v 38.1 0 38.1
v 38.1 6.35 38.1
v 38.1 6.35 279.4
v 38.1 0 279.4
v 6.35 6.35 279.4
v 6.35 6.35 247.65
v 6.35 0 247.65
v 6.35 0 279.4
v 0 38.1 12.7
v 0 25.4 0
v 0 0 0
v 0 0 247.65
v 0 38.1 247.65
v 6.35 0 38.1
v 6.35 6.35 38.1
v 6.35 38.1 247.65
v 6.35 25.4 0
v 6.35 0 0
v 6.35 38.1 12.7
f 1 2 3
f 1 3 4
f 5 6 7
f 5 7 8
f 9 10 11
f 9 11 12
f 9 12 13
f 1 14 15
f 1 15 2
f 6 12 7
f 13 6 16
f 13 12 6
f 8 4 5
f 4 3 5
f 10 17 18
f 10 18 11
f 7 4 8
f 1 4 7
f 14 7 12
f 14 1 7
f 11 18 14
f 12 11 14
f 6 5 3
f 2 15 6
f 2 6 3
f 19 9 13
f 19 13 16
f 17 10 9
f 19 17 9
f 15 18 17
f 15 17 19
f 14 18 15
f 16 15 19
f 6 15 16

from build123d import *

# Parameters (mm, degrees)
BOSS_EXTRUDE1_DEPTH = 279.4
SKETCH2_W           = 31.75
SKETCH2_H           = 38.1
CUT_EXTRUDE1_DEPTH  = 6.35
SKETCH3_W           = 31.75
SKETCH3_H           = 38.1
CUT_EXTRUDE2_DEPTH  = 39.1
CUT_EXTRUDE3_DEPTH  = 39.1


with BuildPart() as part:
    # Sketch1 → Boss-Extrude1 (new body)
    with BuildSketch(Plane.XY):
        Polygon((0, 0), (0, 38.1), (6.35, 38.1), (6.35, 6.35), (38.1, 6.35), (38.1, 0), align=None)
    extrude(amount=BOSS_EXTRUDE1_DEPTH)

    # Sketch2 → Cut-Extrude1 (cut)
    with BuildSketch(Plane.ZY):
        with Locations((263.525, 19.05)):
            Rectangle(SKETCH2_W, SKETCH2_H)
    extrude(amount=-CUT_EXTRUDE1_DEPTH, mode=Mode.SUBTRACT)

    # Sketch3 → Cut-Extrude2 (cut, through all)
    with BuildSketch(Plane.XZ):
        with Locations((22.225, 19.05)):
            Rectangle(SKETCH3_W, SKETCH3_H)
    extrude(amount=-CUT_EXTRUDE2_DEPTH, mode=Mode.SUBTRACT)

    # Sketch4 → Cut-Extrude3 (cut, through all)
    with BuildSketch(Plane.ZY):
        Polygon((0, 38.1), (0, 25.4), (12.7, 38.1), align=None)
    extrude(amount=-CUT_EXTRUDE3_DEPTH, mode=Mode.SUBTRACT)


solid = part.part
